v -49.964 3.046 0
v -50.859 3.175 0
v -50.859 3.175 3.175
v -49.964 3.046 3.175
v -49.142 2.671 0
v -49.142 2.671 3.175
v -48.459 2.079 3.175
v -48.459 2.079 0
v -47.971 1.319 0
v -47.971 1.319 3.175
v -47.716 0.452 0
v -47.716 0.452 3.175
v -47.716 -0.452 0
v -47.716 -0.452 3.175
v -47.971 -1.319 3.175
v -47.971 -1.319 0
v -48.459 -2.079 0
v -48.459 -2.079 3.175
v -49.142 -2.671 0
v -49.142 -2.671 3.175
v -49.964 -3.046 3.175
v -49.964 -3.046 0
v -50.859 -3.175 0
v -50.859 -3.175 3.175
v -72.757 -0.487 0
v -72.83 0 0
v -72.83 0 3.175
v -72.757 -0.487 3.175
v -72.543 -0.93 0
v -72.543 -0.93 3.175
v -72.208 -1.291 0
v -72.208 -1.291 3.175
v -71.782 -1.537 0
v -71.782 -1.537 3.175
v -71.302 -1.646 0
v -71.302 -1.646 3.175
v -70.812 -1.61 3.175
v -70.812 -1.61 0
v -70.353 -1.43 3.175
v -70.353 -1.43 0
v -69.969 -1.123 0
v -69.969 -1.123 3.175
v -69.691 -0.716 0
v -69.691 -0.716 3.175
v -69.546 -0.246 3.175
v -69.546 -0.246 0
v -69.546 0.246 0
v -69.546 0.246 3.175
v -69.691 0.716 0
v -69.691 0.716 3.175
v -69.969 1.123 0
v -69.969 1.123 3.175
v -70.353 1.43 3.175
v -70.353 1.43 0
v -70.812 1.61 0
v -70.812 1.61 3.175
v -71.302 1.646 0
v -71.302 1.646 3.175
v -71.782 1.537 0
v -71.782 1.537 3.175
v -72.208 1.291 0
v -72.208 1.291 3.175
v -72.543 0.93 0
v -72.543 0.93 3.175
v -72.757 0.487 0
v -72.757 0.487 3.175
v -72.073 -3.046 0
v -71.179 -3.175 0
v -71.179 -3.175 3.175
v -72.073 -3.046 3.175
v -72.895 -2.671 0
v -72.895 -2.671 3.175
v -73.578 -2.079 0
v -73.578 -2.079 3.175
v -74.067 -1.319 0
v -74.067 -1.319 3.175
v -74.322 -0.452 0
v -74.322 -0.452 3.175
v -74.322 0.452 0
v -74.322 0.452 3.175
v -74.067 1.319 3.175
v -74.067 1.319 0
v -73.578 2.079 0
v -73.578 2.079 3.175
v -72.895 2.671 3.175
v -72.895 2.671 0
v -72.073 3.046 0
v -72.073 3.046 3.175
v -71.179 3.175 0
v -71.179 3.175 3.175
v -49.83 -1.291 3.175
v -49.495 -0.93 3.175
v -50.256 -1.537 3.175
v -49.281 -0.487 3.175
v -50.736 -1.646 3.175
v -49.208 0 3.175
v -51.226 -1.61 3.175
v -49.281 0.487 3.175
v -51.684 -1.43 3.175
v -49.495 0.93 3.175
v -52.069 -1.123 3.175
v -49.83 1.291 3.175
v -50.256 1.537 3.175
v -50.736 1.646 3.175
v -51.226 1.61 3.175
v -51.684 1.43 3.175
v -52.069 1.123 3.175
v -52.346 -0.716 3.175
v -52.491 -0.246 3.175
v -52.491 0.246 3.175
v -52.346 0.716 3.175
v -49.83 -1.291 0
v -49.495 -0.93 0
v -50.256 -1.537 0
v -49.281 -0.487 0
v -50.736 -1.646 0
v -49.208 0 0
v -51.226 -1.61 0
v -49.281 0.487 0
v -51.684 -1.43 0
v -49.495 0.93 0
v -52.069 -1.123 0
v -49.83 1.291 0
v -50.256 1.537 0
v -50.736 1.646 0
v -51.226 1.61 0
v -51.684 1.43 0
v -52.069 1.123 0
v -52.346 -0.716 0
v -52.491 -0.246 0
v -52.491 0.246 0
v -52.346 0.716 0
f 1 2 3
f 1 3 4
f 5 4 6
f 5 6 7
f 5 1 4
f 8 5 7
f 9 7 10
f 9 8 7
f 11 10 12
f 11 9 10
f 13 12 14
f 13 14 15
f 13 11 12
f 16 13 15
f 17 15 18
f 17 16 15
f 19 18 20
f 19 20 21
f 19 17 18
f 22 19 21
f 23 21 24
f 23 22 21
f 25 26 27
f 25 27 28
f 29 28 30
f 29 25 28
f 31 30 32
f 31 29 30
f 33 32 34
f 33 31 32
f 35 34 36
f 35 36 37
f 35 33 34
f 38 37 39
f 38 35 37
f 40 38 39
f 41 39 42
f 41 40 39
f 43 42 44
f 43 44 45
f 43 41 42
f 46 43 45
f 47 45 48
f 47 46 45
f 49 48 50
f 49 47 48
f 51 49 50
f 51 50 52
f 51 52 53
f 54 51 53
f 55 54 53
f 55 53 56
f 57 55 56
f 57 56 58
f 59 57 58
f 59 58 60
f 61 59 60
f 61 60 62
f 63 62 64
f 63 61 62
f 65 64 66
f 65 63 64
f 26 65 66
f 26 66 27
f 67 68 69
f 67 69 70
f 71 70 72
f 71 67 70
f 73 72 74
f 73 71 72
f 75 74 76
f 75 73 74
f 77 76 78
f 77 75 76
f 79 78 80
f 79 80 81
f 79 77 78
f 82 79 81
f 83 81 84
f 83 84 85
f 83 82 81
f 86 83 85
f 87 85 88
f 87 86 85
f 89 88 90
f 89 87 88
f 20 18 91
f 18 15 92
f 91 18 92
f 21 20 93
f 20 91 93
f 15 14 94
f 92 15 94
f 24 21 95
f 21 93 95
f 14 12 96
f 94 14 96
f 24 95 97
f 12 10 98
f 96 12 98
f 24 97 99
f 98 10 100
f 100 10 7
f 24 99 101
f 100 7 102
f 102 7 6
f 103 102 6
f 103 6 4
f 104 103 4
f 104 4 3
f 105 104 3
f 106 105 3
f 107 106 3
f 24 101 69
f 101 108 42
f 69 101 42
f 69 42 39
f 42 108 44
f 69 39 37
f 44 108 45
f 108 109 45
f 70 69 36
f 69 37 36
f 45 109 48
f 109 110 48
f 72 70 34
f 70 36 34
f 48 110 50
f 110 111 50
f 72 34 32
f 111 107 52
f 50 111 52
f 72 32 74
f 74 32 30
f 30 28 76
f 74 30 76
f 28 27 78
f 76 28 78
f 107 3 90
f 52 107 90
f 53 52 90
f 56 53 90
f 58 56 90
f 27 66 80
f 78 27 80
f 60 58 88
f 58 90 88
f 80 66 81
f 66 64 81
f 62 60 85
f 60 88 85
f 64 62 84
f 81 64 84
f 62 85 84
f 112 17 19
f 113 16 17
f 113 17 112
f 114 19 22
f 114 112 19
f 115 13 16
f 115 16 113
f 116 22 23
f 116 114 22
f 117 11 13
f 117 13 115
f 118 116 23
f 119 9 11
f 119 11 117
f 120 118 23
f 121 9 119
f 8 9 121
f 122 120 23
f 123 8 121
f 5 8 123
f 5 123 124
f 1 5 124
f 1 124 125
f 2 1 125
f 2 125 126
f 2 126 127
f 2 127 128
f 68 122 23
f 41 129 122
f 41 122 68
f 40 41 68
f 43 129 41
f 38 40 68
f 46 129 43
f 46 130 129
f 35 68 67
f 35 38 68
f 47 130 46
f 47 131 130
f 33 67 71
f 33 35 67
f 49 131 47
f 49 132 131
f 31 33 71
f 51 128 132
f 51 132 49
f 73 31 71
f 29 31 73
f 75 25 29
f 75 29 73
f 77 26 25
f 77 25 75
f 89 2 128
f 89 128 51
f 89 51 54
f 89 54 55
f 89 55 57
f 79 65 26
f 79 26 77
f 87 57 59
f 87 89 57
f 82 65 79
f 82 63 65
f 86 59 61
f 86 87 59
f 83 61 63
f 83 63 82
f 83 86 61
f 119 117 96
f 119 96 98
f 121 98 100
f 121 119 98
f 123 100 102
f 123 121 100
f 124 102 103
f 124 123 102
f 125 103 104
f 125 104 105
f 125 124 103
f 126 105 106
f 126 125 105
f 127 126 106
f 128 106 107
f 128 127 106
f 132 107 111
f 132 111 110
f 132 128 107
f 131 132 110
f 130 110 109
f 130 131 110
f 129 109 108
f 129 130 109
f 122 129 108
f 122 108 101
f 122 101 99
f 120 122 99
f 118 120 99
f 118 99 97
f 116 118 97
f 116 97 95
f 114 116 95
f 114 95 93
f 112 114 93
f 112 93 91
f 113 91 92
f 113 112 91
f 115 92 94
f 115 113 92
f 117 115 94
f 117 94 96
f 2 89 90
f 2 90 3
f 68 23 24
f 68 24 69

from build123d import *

# Parameters (mm, degrees)
SKETCH1_R           = 1.651
BOSS_EXTRUDE1_DEPTH = 3.175


with BuildPart() as part:
    # Sketch1 → Boss-Extrude1 (new body)
    with BuildSketch(Plane.XY):
        with BuildLine():
            Line((-71.178896696, 3.175), (-50.858896696, 3.175))
            ThreePointArc((-50.858896696, 3.175), (-47.683896696, 0), (-50.858896696, -3.175))
            Line((-50.858896696, -3.175), (-71.178896696, -3.175))
            ThreePointArc((-71.178896696, -3.175), (-74.353896696, 0), (-71.178896696, 3.175))
        make_face()
        with Locations((-50.858896696, 0)):
            Circle(SKETCH1_R, mode=Mode.SUBTRACT)
        with Locations(Location((-71.178896696, 0, 0), (0, 0, 180))):
            Circle(SKETCH1_R, mode=Mode.SUBTRACT)
    extrude(amount=BOSS_EXTRUDE1_DEPTH)


solid = part.part
